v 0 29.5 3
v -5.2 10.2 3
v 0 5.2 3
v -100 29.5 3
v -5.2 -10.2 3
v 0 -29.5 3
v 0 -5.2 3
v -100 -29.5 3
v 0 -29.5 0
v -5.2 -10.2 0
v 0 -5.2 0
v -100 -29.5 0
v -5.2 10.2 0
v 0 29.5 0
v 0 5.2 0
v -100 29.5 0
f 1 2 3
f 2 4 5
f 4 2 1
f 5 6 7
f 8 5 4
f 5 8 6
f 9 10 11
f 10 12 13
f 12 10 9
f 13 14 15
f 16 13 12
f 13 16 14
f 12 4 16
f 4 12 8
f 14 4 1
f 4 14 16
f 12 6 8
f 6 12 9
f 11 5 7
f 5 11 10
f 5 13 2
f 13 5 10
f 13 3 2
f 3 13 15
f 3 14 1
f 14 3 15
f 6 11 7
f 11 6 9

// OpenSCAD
// -*- mode: SCAD ; c-file-style: "ellemtel" ; coding: utf-8 -*-
//
// correctly sized simple shape to stack four picture 135 type film strips
//
// © 2018 Roland Sieker <ospalh@gmail.com>
// Licence: CC-BY-SA 4.0


// … to preview. You will get all parts when you click “Create Thing”.
part = "leftlid"; // [stack: Stapler, lid: Deckel, leftstack, rightstack, leftlid, rightlid]

// Set this to “render” and click on “Create Thing” when done with the setup.
preview = 1; // [0:render, 1:preview]
// not needed

l1 = 200;
ex = 3;
num = 1;
lld = l1*num;
ll = lld + ex;
ey = 1;
w1 = 60;
wst = w1+ey; // 9.2 mm + clearance
wld = w1-ey; // Make it fit between the plates without problems
h = 30; // I have a lot of film strips i want to stack

w = 1.2;  // Wall width

epl = wld + 2*w;
spl = 10;
spo = 20;
spsp = ll/4;

hl = 30;
hw = 10;

jl = 5;

/* [Hidden] */

// Done with the customizer

// *******************************************************
// Extra parameters. These can be changed reasonably safely.



p = 3;  // Bottom, top plate height
c = 0.4;  // Clearance
angle = 60; // Overhangs much below 60° are a problem for me

// *******************************************************
// Some shortcuts. These shouldn’t be changed

tau = 2 * PI;  // π is still wrong. τ = circumference ÷ r

xy_factor = 1/tan(angle);
// To get from a height to a horizontal width inclined correctly
z_factor = tan(angle);  // The other way around

he = h + 2*p;
spo2 = ll/2 - spo - spl;

some_distance = 50;
ms = 0.01;  // Muggeseggele.

// fn for differently sized objects and fs, fa; all for preview or rendering.
pna = 40;
pnb = 15;
pa = 5;
ps = 1;
rna = 180;
rnb = 30;
ra = 1;
rs = 0.1;
function na() = (preview) ? pna : rna;
function nb() = (preview) ? pnb : rnb;
$fs = (preview) ? ps : rs;
$fa = (preview) ? pa : ra;

// *******************************************************
// End setup



// *******************************************************
// Generate the parts

print_part();
// preview_parts();
// stack_parts();
// left_stack();
// right_stack();

module print_part()
{
   if ("stack" == part)
   {
      stack();
   }
   if ("leftstack" == part)
   {
      left_stack();
   }
   if ("rightstack" == part)
   {
      right_stack();
   }
   if ("lid" == part)
   {
      lid();
   }
   if ("leftlid" == part)
   {
      left_lid();
   }
   if ("rightlid" == part)
   {
      right_lid();
   }
}

module preview_parts()
{
   stack();
   translate([0, some_distance, 0])
   {
      lid();
   }
   translate([-2*jl, 2*some_distance, 0])
   {
      left_stack();
   }
   translate([+2*jl, some_distance, 0])
   {
      right_stack();
   }
   translate([-2*jl, 3*some_distance, 0])
   {
      left_lid();
   }
   translate([+2*jl, 3*some_distance, 0])
   {
      right_lid();
   }
}

module stack_parts()
{
   // intersection()
   {
      color("yellow")
      {
         stack();
      }
      translate([0,0, 3*p])
      {
         color("red")
         {
            lid();
         }
      }
   }
}

// *******************************************************
// Code for the parts themselves

module stack()
{
   translate([0,0,p/2])
   {
      cube([ll, wst, p], center=true);
   }
   plates();
   h_cube();
   mirror()
   {
      h_cube();
   }
   module h_cube()
   {
      translate([ll/2-ms-hw/2, 0, p/2])
      {
         cube([hw, hl, p], center=true);
      }

   }
}

module left_stack()
{
   intersection()
   {
      stack();
      left_joint(c/2);
   }
}

module right_stack()
{
   difference()
   {
      stack();
      left_joint(-c/2);
   }
}

module lid()
{
   translate([0,0,p/2])
   {
      cube([lld, wld, p], center=true);
   }
}




module left_lid()
{
   intersection()
   {
      lid();
      left_joint(c/2);
   }
}

module right_lid()
{
   difference()
   {
      lid();
      left_joint(-c/2);
   }
}


module left_joint(jc)
{
   translate([0, 0, -h])
   {
      linear_extrude(3*h)
      {
         polygon(ljp);
      }
   }
   ljp = [
      [-jl-jc, 2*jl+jc],
      [0, jl+jc],
      [0, ll],
      [-ll, ll],
      [-ll, -ll],
      [0, -ll],
      [0, -jl-jc],
      [-jl-jc, -2*jl-jc],
      [-jl-jc, 2*jl+jc]
      ];
}

module plates()
{
   end_plate();
   side_plate(0);
   side_plate(spsp);
   // side_plate(2*spsp);
   rotate(180)
   {
      side_plate(0);
      side_plate(spsp);
      // side_plate(2*spsp);
   }
   mirror()
   {
      end_plate();
      side_plate(0);
      side_plate(spsp);
      // side_plate(2*spsp);
      rotate(180)
      {
         side_plate(0);
         side_plate(spsp);
         // side_plate(2*spsp);
      }
   }
}

module end_plate()
{
   translate([ll/2-ms , -epl/4,0])
   {
      cube([w, epl/2, he]);
   }
}

module side_plate(xo)
{
   translate([spo2-xo, wst/2-ms,0])
   {
      cube([spl, w, he]);
   }
}
